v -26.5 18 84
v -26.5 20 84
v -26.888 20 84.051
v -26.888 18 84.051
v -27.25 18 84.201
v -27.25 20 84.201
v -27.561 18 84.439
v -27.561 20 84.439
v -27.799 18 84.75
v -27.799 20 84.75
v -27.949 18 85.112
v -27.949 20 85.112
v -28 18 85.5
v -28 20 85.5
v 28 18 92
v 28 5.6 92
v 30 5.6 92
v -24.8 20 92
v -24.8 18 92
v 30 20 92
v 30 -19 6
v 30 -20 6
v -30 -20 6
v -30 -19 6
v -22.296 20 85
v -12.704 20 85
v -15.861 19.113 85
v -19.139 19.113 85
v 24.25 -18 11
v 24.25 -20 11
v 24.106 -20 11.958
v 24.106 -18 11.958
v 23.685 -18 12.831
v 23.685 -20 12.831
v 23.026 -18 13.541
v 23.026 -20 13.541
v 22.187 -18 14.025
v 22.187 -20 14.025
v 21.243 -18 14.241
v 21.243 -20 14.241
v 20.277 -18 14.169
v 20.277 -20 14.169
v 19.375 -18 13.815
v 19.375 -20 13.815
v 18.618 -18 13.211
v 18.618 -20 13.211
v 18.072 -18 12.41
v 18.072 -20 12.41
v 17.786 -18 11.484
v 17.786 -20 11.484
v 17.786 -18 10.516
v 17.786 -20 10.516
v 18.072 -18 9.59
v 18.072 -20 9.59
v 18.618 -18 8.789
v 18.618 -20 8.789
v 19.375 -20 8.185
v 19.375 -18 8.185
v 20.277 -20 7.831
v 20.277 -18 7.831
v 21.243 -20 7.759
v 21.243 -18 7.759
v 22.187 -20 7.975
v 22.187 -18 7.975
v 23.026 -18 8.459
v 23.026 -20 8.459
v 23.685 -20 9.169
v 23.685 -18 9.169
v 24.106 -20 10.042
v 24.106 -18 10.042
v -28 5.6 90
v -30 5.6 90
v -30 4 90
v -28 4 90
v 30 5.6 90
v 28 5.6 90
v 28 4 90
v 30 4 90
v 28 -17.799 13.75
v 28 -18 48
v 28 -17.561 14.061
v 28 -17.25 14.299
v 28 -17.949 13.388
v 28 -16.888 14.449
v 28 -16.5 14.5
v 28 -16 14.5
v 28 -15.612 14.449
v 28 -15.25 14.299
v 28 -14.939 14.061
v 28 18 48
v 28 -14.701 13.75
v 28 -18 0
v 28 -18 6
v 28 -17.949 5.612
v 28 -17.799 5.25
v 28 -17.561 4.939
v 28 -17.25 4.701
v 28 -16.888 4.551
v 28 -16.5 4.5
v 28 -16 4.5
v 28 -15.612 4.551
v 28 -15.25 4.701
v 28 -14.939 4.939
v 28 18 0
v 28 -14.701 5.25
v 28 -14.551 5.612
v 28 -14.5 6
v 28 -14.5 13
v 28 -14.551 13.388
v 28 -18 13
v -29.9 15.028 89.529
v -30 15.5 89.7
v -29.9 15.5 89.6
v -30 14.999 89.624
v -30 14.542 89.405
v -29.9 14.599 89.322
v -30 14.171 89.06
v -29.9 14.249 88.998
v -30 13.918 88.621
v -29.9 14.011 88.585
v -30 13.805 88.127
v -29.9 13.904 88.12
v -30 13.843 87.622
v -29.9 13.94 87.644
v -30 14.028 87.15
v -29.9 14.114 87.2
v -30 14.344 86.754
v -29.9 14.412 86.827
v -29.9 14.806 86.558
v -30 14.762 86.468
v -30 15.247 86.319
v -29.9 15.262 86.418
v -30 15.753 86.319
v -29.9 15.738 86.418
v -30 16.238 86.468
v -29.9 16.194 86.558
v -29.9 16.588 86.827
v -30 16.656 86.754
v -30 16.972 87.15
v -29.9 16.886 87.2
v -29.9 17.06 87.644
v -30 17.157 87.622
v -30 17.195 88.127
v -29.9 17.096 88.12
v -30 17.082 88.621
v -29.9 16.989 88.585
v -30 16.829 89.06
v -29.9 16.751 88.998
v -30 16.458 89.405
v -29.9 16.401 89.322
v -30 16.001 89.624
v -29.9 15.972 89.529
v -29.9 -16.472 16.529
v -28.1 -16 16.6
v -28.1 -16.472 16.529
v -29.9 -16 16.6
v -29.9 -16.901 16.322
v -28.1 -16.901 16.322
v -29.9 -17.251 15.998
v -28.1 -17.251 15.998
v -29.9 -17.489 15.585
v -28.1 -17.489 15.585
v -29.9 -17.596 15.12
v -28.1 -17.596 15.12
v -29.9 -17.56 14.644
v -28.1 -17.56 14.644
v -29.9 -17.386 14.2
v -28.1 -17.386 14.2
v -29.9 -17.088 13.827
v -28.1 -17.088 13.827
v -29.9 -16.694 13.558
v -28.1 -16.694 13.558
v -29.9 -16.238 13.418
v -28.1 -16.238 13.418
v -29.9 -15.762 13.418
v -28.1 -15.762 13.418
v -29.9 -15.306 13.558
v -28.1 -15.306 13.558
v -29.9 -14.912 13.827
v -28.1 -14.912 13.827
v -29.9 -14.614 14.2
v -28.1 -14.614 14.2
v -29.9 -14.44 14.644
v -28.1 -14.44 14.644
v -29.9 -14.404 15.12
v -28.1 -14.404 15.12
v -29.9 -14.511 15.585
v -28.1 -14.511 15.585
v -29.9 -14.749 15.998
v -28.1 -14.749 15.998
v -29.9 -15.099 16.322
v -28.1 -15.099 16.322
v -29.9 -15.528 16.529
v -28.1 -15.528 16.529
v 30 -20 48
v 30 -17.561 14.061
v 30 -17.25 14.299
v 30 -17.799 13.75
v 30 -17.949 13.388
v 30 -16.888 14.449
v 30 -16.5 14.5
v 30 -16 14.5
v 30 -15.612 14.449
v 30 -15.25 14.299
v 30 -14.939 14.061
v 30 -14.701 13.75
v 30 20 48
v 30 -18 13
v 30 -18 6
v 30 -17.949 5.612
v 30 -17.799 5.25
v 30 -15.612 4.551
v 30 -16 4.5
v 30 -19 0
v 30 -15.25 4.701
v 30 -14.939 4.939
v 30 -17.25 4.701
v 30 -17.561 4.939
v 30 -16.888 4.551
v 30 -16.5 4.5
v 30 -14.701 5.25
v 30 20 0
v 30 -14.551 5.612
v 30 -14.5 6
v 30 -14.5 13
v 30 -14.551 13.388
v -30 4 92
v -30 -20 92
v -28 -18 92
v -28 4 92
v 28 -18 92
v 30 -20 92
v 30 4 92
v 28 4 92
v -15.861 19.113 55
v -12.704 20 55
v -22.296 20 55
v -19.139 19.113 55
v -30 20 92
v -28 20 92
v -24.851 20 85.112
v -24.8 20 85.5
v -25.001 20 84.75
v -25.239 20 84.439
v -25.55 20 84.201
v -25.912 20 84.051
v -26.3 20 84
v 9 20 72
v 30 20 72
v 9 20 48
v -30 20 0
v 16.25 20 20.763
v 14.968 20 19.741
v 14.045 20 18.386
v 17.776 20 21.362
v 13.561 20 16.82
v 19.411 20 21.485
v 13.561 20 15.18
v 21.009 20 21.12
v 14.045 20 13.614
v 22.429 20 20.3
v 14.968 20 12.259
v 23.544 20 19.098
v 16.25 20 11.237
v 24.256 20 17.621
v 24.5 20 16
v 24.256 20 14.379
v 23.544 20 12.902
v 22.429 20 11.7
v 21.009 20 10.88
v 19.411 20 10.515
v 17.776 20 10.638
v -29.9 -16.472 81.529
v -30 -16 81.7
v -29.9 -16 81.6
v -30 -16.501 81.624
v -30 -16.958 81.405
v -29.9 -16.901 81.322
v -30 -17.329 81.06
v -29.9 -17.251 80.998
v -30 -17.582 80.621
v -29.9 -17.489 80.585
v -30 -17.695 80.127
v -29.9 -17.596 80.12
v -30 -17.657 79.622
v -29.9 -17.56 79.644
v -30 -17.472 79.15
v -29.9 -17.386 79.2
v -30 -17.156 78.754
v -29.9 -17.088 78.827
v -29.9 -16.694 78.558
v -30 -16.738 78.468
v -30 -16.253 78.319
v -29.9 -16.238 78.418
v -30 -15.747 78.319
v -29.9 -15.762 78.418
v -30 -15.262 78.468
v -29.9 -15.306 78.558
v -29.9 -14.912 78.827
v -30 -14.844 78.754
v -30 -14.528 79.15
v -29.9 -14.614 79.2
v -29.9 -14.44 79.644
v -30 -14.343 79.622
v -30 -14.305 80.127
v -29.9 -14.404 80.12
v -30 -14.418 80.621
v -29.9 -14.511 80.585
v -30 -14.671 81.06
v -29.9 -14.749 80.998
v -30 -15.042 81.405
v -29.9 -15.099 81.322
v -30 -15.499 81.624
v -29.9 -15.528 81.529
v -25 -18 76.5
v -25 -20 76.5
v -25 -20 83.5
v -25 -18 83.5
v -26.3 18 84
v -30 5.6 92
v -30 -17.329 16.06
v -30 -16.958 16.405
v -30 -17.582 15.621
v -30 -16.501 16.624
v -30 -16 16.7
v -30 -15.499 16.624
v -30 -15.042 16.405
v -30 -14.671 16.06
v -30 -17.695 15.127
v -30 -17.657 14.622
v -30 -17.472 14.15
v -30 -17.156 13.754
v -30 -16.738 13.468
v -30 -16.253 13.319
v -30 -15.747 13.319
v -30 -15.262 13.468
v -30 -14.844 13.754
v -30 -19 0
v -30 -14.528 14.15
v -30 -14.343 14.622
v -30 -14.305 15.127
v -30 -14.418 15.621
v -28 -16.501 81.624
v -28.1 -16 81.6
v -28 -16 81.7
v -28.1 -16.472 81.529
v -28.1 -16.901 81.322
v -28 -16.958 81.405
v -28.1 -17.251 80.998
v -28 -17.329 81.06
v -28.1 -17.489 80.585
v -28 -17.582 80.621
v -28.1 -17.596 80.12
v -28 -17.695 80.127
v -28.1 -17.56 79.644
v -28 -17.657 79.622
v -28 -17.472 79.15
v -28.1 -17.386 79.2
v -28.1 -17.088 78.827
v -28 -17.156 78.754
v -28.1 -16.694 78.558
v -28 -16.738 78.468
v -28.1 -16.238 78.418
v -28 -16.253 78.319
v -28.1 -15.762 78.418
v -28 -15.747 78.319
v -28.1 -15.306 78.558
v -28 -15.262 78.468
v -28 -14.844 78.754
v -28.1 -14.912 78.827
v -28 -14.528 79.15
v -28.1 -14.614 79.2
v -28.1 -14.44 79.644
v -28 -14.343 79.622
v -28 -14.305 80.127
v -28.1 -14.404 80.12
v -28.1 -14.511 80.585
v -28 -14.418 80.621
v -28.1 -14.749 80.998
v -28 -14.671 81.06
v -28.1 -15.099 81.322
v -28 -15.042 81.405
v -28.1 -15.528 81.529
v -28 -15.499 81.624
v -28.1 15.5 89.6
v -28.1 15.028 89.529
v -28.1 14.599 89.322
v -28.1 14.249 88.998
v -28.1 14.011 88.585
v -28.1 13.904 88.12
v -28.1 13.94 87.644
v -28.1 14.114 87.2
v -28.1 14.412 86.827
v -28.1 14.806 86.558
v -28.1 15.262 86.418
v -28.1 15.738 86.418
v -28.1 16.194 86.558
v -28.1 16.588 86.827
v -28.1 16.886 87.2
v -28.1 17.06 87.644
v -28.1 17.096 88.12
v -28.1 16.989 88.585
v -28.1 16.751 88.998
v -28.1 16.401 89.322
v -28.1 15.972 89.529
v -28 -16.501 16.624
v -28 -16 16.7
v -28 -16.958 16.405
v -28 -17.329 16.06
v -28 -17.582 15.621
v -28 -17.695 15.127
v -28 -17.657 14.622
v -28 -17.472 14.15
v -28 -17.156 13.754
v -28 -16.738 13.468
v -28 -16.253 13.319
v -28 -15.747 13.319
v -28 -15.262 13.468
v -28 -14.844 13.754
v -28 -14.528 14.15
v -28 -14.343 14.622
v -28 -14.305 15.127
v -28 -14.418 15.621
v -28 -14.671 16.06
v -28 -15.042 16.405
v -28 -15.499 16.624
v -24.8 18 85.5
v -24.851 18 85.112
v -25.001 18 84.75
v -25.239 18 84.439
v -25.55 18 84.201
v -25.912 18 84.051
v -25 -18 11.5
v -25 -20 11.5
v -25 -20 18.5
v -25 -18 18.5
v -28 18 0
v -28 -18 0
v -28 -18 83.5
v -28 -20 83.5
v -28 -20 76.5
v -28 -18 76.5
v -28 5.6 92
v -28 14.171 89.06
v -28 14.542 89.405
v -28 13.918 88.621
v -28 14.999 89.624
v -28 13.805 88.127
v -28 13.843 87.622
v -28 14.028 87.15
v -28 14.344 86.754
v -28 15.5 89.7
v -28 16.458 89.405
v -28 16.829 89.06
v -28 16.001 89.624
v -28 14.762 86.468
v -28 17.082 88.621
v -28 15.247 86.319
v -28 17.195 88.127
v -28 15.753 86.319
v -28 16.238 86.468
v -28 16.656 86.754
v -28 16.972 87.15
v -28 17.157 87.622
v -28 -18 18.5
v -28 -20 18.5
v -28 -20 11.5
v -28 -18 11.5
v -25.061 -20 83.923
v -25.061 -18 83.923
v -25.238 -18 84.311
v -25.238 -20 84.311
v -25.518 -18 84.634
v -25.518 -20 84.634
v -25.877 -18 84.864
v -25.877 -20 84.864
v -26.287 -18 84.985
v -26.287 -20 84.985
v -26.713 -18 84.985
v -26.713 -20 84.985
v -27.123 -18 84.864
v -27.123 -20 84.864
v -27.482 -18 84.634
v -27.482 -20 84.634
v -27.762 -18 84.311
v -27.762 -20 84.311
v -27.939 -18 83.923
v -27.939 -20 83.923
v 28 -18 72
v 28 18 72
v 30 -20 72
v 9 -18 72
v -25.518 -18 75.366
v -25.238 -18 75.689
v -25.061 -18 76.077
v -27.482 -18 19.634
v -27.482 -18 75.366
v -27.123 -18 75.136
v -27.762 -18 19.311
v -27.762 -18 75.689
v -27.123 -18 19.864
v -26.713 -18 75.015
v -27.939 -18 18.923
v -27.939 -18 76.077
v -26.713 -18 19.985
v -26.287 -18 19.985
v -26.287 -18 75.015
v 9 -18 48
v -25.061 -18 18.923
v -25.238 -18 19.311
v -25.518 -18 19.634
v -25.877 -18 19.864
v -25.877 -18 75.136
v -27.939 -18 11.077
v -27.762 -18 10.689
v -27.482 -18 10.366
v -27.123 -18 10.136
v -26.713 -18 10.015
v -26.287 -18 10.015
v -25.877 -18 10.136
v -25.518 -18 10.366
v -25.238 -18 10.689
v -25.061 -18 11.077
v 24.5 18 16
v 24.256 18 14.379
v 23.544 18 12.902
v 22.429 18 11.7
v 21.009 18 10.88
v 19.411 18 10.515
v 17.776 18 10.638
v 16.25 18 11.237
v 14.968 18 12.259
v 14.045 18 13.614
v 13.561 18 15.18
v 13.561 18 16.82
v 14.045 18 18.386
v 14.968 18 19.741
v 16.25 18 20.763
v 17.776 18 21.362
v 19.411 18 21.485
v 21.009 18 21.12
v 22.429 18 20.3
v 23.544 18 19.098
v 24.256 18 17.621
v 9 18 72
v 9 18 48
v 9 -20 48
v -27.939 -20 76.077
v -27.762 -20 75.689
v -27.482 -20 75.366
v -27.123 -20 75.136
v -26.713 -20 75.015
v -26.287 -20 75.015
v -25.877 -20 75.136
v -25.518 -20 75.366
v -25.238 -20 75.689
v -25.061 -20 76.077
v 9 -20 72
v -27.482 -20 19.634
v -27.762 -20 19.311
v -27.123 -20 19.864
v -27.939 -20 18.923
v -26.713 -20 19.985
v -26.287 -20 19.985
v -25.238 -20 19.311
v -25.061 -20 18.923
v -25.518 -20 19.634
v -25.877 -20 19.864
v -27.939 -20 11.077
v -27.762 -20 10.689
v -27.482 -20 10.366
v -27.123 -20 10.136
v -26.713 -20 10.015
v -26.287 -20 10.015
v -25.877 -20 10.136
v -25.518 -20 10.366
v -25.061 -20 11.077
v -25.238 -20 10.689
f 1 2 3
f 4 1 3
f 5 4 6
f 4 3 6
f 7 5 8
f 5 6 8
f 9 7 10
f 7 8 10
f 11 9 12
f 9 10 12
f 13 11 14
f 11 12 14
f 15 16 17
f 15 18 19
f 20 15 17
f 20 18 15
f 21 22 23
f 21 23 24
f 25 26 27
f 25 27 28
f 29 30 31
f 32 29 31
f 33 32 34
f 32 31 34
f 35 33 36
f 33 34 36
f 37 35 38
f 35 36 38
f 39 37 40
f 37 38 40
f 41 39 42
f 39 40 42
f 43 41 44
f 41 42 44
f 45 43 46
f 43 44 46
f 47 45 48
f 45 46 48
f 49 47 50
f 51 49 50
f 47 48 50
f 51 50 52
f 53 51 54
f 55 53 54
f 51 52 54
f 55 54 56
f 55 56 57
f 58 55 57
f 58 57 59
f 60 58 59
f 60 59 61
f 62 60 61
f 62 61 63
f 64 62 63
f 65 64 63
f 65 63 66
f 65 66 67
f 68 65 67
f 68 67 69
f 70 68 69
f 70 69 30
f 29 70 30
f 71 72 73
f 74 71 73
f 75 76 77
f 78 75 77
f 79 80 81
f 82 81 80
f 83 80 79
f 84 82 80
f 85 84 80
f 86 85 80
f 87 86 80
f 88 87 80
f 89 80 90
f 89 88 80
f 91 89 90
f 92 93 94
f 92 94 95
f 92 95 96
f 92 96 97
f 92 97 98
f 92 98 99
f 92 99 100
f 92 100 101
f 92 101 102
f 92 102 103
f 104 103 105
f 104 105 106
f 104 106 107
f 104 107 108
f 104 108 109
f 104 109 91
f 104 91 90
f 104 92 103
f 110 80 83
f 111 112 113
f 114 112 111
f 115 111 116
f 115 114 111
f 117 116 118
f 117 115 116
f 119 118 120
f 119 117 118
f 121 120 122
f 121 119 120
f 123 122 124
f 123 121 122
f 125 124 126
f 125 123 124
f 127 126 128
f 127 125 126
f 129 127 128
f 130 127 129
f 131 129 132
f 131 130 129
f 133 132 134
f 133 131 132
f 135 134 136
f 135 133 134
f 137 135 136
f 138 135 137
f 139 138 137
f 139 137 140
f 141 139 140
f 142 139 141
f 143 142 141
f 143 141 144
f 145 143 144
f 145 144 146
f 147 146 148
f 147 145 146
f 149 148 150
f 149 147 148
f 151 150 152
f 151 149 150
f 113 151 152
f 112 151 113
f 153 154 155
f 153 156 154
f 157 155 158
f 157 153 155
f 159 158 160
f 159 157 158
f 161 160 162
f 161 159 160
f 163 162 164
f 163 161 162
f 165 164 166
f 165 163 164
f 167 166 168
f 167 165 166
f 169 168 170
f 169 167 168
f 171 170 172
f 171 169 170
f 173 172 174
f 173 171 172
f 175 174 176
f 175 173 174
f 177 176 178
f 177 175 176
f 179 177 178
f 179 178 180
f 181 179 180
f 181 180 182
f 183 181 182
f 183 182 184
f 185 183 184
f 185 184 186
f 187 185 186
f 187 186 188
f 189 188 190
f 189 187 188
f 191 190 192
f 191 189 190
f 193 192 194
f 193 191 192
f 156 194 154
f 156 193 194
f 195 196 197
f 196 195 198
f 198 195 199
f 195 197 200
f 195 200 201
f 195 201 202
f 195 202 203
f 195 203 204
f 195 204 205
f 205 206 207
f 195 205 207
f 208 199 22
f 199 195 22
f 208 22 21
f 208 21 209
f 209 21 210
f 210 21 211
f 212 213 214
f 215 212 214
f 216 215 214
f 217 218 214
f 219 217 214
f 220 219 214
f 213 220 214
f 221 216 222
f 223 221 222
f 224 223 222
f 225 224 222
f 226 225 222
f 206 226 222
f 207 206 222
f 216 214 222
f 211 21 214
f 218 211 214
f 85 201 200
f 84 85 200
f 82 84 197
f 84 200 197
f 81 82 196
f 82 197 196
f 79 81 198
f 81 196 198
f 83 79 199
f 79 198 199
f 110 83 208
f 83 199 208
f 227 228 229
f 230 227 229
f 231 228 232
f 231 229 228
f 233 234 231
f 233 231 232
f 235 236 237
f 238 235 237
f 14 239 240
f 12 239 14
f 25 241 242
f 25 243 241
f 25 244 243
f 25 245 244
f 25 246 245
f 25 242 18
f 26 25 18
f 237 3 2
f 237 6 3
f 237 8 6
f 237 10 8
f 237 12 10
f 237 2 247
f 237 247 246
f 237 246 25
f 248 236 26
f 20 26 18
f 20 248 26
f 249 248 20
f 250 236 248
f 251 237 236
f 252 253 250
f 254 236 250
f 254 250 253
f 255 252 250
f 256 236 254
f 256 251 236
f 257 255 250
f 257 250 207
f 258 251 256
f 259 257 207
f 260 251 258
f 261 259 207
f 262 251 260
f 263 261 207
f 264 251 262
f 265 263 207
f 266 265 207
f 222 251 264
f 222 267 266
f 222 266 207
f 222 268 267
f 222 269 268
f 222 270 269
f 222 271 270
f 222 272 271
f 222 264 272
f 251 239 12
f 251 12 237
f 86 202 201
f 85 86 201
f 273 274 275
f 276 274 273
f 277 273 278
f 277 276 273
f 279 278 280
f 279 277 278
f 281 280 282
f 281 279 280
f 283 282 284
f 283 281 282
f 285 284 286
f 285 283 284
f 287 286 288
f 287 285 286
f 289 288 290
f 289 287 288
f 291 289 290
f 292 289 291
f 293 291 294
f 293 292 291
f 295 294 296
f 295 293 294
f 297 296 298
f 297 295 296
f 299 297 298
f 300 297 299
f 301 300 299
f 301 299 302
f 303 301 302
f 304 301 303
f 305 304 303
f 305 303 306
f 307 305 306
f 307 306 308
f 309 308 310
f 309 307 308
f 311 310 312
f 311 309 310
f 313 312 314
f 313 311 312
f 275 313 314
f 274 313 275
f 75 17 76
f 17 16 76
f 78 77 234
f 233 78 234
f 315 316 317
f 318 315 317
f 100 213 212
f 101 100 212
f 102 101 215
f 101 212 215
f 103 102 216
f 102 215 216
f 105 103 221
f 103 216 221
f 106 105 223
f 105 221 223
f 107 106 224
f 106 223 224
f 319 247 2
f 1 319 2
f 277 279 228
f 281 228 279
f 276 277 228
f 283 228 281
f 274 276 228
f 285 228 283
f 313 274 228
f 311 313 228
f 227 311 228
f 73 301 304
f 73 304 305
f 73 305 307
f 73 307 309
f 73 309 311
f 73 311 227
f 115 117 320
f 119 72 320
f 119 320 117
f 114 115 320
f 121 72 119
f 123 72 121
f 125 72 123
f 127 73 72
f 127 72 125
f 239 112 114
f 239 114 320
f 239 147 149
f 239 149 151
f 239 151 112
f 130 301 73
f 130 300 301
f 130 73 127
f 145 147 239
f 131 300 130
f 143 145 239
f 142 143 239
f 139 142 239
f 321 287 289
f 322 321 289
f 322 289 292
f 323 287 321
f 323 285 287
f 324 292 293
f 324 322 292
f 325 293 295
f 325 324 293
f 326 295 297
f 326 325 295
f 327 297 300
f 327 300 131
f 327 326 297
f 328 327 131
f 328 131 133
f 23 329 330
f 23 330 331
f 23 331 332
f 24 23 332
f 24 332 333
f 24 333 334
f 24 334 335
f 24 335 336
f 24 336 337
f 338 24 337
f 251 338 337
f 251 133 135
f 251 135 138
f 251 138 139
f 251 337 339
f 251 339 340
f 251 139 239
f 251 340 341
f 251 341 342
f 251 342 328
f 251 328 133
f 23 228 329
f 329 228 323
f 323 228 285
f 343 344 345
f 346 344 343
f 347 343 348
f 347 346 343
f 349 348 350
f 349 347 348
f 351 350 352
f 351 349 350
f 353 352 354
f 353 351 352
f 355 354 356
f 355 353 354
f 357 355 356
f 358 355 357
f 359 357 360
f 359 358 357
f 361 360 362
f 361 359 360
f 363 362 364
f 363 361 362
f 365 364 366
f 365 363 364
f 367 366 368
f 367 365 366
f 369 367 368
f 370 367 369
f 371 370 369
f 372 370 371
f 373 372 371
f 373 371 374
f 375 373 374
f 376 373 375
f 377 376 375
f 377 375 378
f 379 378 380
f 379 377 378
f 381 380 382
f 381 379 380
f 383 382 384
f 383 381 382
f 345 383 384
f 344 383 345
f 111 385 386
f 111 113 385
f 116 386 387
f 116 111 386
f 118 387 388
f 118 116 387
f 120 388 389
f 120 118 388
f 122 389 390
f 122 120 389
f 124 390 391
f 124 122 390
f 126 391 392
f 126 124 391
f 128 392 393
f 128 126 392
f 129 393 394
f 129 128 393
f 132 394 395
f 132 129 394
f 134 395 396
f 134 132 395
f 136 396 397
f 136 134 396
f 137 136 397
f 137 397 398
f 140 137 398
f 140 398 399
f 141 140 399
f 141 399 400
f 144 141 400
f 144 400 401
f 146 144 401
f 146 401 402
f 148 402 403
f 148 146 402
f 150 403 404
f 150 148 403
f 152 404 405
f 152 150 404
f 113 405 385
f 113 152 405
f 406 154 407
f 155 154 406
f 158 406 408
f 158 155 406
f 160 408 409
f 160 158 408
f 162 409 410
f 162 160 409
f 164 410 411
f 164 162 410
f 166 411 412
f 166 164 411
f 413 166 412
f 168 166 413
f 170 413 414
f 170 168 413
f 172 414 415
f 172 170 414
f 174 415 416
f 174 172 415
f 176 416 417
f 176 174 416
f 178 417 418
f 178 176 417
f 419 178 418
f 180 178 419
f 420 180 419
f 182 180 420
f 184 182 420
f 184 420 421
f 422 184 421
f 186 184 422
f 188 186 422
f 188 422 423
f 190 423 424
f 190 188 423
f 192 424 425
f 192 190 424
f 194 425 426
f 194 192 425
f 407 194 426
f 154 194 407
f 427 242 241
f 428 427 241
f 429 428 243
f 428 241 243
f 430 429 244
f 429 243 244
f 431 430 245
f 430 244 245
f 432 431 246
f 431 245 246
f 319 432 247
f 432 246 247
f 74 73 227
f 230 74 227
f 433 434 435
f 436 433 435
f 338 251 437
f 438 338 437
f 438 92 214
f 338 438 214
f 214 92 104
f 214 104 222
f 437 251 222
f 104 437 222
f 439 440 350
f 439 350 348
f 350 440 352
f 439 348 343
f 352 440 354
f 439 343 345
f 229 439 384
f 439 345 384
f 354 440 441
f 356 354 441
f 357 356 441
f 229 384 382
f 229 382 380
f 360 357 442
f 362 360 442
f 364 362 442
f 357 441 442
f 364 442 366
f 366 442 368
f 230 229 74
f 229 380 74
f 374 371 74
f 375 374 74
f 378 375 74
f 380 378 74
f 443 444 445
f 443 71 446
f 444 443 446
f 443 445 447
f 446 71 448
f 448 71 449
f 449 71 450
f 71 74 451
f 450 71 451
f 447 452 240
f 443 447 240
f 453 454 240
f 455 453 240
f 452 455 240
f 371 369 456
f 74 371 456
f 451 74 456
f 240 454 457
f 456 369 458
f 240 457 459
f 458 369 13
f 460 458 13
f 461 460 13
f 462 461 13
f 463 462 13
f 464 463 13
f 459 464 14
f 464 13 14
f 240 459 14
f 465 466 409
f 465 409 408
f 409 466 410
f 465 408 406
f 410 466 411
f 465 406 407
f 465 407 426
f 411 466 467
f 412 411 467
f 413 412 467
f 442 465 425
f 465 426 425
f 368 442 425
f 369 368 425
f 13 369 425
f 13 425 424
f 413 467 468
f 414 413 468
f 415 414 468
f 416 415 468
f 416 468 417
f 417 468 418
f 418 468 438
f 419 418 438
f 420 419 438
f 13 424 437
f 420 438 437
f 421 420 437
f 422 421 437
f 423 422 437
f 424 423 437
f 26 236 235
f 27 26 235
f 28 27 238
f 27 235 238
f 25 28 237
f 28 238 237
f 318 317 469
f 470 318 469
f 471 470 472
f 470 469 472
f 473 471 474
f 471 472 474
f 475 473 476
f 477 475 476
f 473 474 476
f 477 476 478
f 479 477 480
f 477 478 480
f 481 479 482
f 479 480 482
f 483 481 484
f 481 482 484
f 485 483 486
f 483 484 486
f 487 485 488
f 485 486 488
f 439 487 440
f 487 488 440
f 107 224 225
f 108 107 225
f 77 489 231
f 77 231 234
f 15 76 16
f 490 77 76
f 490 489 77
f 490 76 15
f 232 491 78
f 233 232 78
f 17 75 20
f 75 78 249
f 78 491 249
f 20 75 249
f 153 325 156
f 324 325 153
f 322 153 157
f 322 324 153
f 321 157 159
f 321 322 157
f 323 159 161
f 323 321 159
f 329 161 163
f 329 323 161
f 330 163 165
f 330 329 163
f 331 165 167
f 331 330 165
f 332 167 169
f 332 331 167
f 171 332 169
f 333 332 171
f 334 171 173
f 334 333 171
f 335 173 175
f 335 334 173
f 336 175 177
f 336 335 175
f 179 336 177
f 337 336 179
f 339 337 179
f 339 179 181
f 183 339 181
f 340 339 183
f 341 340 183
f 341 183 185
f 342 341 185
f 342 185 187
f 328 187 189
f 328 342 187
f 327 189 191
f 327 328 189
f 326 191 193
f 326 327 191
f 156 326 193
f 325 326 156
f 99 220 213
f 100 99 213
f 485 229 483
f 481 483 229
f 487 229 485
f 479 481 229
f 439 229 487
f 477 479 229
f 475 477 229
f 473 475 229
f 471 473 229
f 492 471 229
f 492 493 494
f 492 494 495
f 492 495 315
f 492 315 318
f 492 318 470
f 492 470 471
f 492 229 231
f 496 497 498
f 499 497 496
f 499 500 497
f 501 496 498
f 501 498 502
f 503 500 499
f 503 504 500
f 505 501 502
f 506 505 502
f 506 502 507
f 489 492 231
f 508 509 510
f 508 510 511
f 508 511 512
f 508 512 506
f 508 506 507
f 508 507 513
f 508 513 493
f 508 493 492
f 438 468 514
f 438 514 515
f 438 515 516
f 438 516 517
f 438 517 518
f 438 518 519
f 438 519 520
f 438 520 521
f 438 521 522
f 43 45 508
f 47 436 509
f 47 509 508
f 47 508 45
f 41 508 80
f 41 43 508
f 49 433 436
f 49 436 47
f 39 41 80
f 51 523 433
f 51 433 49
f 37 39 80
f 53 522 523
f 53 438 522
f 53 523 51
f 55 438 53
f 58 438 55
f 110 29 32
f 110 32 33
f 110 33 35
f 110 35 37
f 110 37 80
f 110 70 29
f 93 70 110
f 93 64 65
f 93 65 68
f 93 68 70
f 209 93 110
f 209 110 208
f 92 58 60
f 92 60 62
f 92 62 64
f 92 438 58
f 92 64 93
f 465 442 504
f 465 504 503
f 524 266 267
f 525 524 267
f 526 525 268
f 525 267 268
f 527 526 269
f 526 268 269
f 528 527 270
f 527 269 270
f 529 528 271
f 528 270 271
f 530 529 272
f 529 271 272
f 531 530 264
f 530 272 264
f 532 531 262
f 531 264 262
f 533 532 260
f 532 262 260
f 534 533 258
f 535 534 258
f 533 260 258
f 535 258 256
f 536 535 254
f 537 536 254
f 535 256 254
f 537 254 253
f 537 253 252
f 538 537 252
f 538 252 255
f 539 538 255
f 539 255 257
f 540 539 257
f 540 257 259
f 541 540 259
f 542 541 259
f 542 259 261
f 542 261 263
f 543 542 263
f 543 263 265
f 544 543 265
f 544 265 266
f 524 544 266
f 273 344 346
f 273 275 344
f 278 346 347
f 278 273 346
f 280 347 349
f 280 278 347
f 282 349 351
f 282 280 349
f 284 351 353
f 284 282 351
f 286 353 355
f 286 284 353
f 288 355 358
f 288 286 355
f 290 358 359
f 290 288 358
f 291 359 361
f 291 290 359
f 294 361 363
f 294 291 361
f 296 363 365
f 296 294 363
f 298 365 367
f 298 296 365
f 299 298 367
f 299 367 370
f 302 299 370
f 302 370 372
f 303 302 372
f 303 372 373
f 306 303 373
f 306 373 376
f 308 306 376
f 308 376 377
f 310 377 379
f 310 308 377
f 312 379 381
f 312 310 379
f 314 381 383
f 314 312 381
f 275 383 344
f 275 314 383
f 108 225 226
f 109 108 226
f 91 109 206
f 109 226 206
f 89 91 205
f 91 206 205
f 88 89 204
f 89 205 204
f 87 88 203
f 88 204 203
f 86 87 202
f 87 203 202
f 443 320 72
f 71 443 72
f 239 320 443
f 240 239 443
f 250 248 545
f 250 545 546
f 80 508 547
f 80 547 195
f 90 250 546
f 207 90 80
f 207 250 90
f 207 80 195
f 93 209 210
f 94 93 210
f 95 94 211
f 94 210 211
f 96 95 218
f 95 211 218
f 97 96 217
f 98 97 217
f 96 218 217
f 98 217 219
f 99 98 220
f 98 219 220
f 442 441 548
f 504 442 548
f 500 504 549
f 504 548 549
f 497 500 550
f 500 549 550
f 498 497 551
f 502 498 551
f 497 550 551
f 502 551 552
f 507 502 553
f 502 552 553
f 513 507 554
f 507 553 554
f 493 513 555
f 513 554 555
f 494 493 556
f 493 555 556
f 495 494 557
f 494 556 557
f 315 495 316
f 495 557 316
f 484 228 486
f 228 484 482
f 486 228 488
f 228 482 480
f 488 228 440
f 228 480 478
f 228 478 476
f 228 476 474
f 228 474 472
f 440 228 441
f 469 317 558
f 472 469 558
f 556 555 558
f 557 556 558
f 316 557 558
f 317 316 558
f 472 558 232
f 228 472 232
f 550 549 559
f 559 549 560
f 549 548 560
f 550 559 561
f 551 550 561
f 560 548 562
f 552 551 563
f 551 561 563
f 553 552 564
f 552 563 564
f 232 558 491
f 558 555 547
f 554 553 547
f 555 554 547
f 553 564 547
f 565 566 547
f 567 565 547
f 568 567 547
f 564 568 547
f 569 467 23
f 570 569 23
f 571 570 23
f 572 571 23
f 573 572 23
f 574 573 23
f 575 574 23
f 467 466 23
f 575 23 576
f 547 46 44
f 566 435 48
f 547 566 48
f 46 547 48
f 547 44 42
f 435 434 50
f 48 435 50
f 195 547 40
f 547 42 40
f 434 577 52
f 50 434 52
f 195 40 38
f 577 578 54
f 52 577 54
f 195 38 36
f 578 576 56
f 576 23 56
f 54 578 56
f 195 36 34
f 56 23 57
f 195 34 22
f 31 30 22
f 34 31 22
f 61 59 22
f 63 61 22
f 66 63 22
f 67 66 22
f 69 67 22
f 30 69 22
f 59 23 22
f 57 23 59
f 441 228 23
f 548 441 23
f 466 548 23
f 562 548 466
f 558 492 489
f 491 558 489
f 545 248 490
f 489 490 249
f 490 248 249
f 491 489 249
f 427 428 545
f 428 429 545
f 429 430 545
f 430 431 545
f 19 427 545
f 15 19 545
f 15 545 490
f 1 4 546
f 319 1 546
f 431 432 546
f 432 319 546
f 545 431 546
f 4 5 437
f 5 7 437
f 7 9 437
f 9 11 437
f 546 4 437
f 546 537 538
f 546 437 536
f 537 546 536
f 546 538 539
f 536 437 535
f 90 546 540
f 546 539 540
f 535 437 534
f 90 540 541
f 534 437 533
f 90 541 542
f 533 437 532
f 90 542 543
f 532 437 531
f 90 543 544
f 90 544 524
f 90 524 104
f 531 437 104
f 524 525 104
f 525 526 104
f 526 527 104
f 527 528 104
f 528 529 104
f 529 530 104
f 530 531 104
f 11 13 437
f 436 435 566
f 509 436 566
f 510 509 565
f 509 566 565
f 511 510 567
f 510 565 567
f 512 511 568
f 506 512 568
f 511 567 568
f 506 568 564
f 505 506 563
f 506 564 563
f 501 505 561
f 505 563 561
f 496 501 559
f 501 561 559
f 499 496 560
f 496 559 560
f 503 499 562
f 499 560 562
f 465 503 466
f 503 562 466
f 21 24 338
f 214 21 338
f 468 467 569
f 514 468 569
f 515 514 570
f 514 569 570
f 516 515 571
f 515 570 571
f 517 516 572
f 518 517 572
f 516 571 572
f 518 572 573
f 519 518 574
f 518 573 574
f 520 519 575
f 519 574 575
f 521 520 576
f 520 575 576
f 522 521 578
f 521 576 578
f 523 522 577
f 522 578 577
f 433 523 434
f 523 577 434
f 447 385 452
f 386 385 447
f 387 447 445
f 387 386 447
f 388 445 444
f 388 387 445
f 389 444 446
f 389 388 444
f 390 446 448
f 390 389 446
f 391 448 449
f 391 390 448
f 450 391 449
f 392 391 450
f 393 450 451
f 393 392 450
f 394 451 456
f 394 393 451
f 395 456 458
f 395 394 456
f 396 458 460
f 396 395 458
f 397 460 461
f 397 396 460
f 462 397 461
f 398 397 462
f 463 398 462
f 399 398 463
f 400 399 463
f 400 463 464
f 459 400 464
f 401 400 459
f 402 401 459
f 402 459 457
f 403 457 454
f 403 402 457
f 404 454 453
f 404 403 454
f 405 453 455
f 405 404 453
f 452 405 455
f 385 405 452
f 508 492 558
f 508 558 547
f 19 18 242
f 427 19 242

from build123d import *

# Parameters (mm, degrees)
SKETCH_1_W                 = 60
SKETCH_1_H                 = 40
SKETCH_1_W_2               = 56
SKETCH_1_H_2               = 36
EXTRUDE_1_DEPTH            = 92
SKETCH_3_W                 = 21
SKETCH_3_H                 = 24
CUT_EXTRUDE_2_DEPTH        = 41
SKETCH_9_R                 = 3.25
CUT_EXTRUDE_4_DEPTH        = 4
CUT_EXTRUDE_5_REACH        = 62
CUT_EXTRUDE_START          = -55
CUT_EXTRUDE_8_DEPTH        = 30
CUT_EXTRUDE_9_REACH        = 42
SKETCH_17_R                = 5.5
SKETCH_18_W                = 6
SKETCH_18_H                = 1
CUT_EXTRUDE_10_DEPTH       = 61
CUT_EXTRUDE_11_REACH       = 42
HOLE_WIZARD_M31_AT_2_COUNT = 2
HOLE_WIZARD_M31_AT_2_PITCH = 79.506289059
HOLE_WIZARD_M31_AT_3_COUNT = 2
HOLE_WIZARD_M31_AT_3_PITCH = 32.5
CUT_EXTRUDE_12_DEPTH       = 61
CUT_EXTRUDE_13_REACH       = 42


with BuildPart() as part:
    # Эскиз1 → Бобышка-Вытянуть1 (new body)
    with BuildSketch(Plane.XY):
        Rectangle(SKETCH_1_W, SKETCH_1_H)
        Rectangle(SKETCH_1_W_2, SKETCH_1_H_2, mode=Mode.SUBTRACT)
    extrude(amount=EXTRUDE_1_DEPTH)

    # Эскиз3 → Вырез-Вытянуть2 (cut, through all)
    with BuildSketch(Plane(origin=(0, 20, 0), x_dir=(1, 0, 0), z_dir=(0, 1, 0))):
        with Locations((19.5, -60)):
            Rectangle(SKETCH_3_W, SKETCH_3_H)
    extrude(amount=-CUT_EXTRUDE_2_DEPTH, mode=Mode.SUBTRACT)

    # Эскиз9 → Вырез-Вытянуть4 (cut)
    with BuildSketch(Plane.XZ.offset(20)):
        with Locations((21, 11)):
            Circle(SKETCH_9_R)
    extrude(amount=-CUT_EXTRUDE_4_DEPTH, mode=Mode.SUBTRACT)

    # Эскиз10 → Вырез-Вытянуть5 (cut, up to next)
    with BuildSketch(Plane(origin=(30, 0, 0), x_dir=(0, 0, -1), z_dir=(1, 0, 0)), mode=Mode.PRIVATE) as cut_extrude_5_sk1:
        with BuildLine():
            Line((-6, -14.5), (-13, -14.5))
            ThreePointArc((-13, -14.5), (-14.060660172, -14.939339828), (-14.5, -16))
            Line((-14.5, -16), (-14.5, -16.5))
            ThreePointArc((-14.5, -16.5), (-14.060660172, -17.560660172), (-13, -18))
            Line((-13, -18), (-6, -18))
            ThreePointArc((-6, -18), (-4.939339828, -17.560660172), (-4.5, -16.5))
            Line((-4.5, -16.5), (-4.5, -16))
            ThreePointArc((-4.5, -16), (-4.939339828, -14.939339828), (-6, -14.5))
        make_face()
    cut_extrude_5_tool1 = extrude(cut_extrude_5_sk1.sketch, amount=-CUT_EXTRUDE_5_REACH, mode=Mode.PRIVATE) & part.part
    add(cut_extrude_5_tool1.solids().sort_by_distance((30, -16.25, 9.5))[0], mode=Mode.SUBTRACT)

    # Эскиз16 → Вырез-Вытянуть8 (cut)
    with BuildSketch(Plane(origin=(0, 0, 0), x_dir=(-1, 0, 0), z_dir=(0, 0, -1)).offset(CUT_EXTRUDE_START)):
        with BuildLine():
            Line((22.295831523, 20), (12.704168477, 20))
            ThreePointArc((12.704168477, 20), (17.5, 19), (22.295831523, 20))
        make_face()
    extrude(amount=-CUT_EXTRUDE_8_DEPTH, mode=Mode.SUBTRACT)

    # Эскиз17 → Вырез-Вытянуть9 (cut, up to next)
    with BuildSketch(Plane(origin=(0, 20, 0), x_dir=(1, 0, 0), z_dir=(0, 1, 0)), mode=Mode.PRIVATE) as cut_extrude_9_sk1:
        with Locations((19, -16)):
            Circle(SKETCH_17_R)
    cut_extrude_9_tool1 = extrude(cut_extrude_9_sk1.sketch, amount=-CUT_EXTRUDE_9_REACH, mode=Mode.PRIVATE) & part.part
    add(cut_extrude_9_tool1.solids().sort_by_distance((19, 20, 16))[0], mode=Mode.SUBTRACT)

    # Эскиз18 → Вырез-Вытянуть10 (cut, through all)
    with BuildSketch(Plane(origin=(30, 0, 0), x_dir=(0, 0, -1), z_dir=(1, 0, 0))):
        with Locations((-3, -19.5)):
            Rectangle(SKETCH_18_W, SKETCH_18_H)
    extrude(amount=-CUT_EXTRUDE_10_DEPTH, mode=Mode.SUBTRACT)

    # Эскиз19 → Вырез-Вытянуть11 (cut, up to next)
    with BuildSketch(Plane(origin=(0, 20, 0), x_dir=(1, 0, 0), z_dir=(0, 1, 0)), mode=Mode.PRIVATE) as cut_extrude_11_sk1:
        with BuildLine():
            Line((-28, -85.5), (-28, -92))
            Line((-28, -92), (-24.8, -92))
            Line((-24.8, -92), (-24.8, -85.5))
            ThreePointArc((-24.8, -85.5), (-25.239339828, -84.439339828), (-26.3, -84))
            Line((-26.3, -84), (-26.5, -84))
            ThreePointArc((-26.5, -84), (-27.560660172, -84.439339828), (-28, -85.5))
        make_face()
    cut_extrude_11_tool1 = extrude(cut_extrude_11_sk1.sketch, amount=-CUT_EXTRUDE_11_REACH, mode=Mode.PRIVATE) & part.part
    add(cut_extrude_11_tool1.solids().sort_by_distance((-26.4, 20, 88.143673))[0], mode=Mode.SUBTRACT)

    # Эскиз20 → Hole Wizard M31 (revolve, cut)
    with BuildSketch(Plane(origin=(-30, 15.5, 88), x_dir=(0, 0, 1), z_dir=(0, 1, 0))):
        Polygon((0, 0), (0, 2), (1.7, 2), (1.6, 1.9), (1.6, 0.1), (1.7, 0), align=None)
    hole_wizard_m31 = revolve(axis=Axis((-36.35, 15.5, 88), (1, 0, 0)), mode=Mode.SUBTRACT)

    # Hole Wizard M31 at 2: Hole Wizard M31 ×2
    with Locations(*[Vector(0, -0.396195073, -0.91816636) * (i * HOLE_WIZARD_M31_AT_2_PITCH) for i in range(1, HOLE_WIZARD_M31_AT_2_COUNT)]):
        add(hole_wizard_m31, mode=Mode.SUBTRACT)

    # Hole Wizard M31 at 3: Hole Wizard M31 ×2
    with Locations(*[Vector(0, -0.969230769, -0.246153846) * (i * HOLE_WIZARD_M31_AT_3_PITCH) for i in range(1, HOLE_WIZARD_M31_AT_3_COUNT)]):
        add(hole_wizard_m31, mode=Mode.SUBTRACT)

    # Эскиз22 → Вырез-Вытянуть12 (cut, through all)
    with BuildSketch(Plane.ZY.offset(30)):
        Polygon((292.990680401, 5.6), (92, 5.6), (90, 5.6), (90, 4), (92, 4), (292.990680401, 4), (694.972041203, 4), (694.972041203, 5.6), align=None)
    extrude(amount=-CUT_EXTRUDE_12_DEPTH, mode=Mode.SUBTRACT)

    # Эскиз23 → Вырез-Вытянуть13 (cut, up to next)
    with BuildSketch(Plane.XZ.offset(20), mode=Mode.PRIVATE) as cut_extrude_13_sk1:
        with BuildLine():
            Line((-25, 11.5), (-25, 18.5))
            ThreePointArc((-25, 18.5), (-26.5, 20), (-28, 18.5))
            Line((-28, 18.5), (-28, 11.5))
            ThreePointArc((-28, 11.5), (-26.5, 10), (-25, 11.5))
        make_face()
    cut_extrude_13_tool1 = extrude(cut_extrude_13_sk1.sketch, amount=-CUT_EXTRUDE_13_REACH, mode=Mode.PRIVATE) & part.part
    add(cut_extrude_13_tool1.solids().sort_by_distance((-26.5, -20, 15))[0], mode=Mode.SUBTRACT)
    # Эскиз23 → Вырез-Вытянуть13 (cut, up to next)
    with BuildSketch(Plane.XZ.offset(20), mode=Mode.PRIVATE) as cut_extrude_13_sk2:
        with BuildLine():
            Line((-28, 83.5), (-28, 76.5))
            ThreePointArc((-28, 76.5), (-26.5, 75), (-25, 76.5))
            Line((-25, 76.5), (-25, 83.5))
            ThreePointArc((-25, 83.5), (-26.5, 85), (-28, 83.5))
        make_face()
    cut_extrude_13_tool2 = extrude(cut_extrude_13_sk2.sketch, amount=-CUT_EXTRUDE_13_REACH, mode=Mode.PRIVATE) & part.part
    add(cut_extrude_13_tool2.solids().sort_by_distance((-26.5, -20, 80))[0], mode=Mode.SUBTRACT)


solid = part.part
